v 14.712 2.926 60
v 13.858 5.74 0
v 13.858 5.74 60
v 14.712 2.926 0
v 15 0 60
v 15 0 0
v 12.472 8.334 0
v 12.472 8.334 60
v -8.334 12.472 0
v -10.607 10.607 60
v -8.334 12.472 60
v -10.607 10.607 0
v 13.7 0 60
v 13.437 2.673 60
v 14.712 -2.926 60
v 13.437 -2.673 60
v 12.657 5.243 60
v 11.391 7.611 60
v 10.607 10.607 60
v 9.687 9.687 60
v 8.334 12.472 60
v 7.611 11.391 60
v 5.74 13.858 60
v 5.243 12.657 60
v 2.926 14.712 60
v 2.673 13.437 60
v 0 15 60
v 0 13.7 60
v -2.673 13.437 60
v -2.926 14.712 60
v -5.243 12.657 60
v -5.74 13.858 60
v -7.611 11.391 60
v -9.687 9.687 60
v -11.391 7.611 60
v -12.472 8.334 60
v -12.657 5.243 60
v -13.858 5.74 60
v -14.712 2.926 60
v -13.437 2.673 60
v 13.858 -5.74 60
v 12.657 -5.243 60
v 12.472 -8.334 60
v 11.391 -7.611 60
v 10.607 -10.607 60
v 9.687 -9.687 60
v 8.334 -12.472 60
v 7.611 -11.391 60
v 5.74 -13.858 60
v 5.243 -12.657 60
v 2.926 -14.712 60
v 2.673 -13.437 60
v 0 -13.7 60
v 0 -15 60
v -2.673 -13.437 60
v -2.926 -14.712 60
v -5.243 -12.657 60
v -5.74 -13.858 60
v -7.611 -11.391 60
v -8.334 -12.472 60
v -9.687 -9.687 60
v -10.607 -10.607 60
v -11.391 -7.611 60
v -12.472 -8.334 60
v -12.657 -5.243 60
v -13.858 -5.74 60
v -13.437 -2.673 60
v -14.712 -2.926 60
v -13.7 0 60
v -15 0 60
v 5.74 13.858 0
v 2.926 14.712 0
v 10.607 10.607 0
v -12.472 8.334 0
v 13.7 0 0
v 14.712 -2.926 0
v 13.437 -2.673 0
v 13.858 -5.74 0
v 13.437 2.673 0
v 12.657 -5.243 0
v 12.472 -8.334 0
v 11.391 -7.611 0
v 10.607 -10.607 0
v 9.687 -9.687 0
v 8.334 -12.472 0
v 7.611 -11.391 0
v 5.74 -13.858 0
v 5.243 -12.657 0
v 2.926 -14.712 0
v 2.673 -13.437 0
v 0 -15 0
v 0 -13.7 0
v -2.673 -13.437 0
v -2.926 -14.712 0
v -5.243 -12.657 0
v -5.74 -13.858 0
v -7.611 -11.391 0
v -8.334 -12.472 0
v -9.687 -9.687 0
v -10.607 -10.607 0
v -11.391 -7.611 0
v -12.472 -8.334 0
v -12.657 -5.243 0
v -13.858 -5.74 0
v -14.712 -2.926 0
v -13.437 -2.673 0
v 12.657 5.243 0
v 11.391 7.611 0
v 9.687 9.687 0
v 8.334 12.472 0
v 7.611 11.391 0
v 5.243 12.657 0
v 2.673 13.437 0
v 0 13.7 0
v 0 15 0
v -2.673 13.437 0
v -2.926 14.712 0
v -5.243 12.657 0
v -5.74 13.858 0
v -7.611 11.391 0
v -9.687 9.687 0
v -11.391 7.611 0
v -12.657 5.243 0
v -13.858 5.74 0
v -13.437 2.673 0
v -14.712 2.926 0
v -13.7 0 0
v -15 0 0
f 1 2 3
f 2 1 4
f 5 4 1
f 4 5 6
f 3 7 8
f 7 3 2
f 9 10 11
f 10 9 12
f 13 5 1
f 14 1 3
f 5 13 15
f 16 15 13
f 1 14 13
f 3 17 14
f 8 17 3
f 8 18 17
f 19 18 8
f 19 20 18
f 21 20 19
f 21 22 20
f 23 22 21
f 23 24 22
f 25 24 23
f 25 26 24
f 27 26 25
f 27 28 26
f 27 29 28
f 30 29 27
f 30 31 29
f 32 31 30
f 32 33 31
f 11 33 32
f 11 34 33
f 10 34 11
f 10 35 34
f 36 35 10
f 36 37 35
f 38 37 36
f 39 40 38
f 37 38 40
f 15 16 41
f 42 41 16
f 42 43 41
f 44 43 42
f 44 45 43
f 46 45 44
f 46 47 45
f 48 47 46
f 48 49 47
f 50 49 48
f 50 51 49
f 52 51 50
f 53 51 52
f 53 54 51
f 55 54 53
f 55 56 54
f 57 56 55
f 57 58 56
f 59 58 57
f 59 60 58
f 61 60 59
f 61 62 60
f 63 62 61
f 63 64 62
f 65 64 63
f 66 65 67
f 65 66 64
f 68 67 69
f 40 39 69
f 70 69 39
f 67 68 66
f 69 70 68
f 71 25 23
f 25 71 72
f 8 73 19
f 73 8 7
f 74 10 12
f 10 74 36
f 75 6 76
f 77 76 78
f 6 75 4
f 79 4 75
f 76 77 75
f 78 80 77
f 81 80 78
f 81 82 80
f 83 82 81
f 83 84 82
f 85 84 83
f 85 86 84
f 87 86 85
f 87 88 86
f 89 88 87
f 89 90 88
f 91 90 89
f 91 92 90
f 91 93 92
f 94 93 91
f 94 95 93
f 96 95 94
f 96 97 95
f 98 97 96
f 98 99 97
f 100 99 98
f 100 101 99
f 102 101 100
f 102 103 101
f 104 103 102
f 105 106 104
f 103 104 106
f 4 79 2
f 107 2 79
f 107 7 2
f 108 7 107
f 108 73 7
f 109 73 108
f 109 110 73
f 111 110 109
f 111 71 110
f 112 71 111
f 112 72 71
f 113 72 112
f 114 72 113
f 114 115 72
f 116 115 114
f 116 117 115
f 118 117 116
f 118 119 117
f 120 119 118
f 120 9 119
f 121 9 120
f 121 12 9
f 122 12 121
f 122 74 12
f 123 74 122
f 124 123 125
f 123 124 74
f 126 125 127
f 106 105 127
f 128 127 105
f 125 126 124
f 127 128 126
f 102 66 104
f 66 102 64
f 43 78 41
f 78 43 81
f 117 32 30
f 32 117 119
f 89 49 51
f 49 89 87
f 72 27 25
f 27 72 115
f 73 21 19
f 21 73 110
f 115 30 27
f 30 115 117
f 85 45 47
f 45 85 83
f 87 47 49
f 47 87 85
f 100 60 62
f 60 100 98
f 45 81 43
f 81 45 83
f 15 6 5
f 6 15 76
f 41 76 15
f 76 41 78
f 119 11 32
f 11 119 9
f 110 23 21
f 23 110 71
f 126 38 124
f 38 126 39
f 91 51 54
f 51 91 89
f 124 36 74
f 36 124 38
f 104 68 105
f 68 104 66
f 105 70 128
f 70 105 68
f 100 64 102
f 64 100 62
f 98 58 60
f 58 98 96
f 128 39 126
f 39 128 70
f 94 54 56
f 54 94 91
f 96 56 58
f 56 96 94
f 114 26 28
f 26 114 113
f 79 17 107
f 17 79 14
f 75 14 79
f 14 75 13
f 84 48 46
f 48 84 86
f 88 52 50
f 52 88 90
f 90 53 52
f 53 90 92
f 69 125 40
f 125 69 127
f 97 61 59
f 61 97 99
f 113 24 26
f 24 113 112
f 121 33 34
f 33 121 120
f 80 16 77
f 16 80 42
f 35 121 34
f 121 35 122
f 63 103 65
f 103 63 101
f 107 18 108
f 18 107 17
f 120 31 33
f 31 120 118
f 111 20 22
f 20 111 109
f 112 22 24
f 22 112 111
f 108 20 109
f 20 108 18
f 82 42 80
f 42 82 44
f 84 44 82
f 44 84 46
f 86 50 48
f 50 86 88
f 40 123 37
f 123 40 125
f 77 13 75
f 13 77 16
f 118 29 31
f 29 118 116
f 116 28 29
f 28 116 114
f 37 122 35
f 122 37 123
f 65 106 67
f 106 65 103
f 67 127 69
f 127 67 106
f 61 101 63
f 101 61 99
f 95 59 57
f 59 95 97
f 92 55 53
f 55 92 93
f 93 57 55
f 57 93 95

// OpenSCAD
$fn = 32;

// ----------------------------------------------------------------------
// Thin tube: 1.3 mm wall
// ----------------------------------------------------------------------

// --- parameters (mm) ---
tube_od = 30;             // outer diameter
tube_h = 60;              // height, Z
wall = 1.3;               // wall thickness

difference() {
  cylinder(h = tube_h, d = tube_od);
  translate([0, 0, -1]) cylinder(h = tube_h + 2, d = tube_od - 2 * wall);
}
